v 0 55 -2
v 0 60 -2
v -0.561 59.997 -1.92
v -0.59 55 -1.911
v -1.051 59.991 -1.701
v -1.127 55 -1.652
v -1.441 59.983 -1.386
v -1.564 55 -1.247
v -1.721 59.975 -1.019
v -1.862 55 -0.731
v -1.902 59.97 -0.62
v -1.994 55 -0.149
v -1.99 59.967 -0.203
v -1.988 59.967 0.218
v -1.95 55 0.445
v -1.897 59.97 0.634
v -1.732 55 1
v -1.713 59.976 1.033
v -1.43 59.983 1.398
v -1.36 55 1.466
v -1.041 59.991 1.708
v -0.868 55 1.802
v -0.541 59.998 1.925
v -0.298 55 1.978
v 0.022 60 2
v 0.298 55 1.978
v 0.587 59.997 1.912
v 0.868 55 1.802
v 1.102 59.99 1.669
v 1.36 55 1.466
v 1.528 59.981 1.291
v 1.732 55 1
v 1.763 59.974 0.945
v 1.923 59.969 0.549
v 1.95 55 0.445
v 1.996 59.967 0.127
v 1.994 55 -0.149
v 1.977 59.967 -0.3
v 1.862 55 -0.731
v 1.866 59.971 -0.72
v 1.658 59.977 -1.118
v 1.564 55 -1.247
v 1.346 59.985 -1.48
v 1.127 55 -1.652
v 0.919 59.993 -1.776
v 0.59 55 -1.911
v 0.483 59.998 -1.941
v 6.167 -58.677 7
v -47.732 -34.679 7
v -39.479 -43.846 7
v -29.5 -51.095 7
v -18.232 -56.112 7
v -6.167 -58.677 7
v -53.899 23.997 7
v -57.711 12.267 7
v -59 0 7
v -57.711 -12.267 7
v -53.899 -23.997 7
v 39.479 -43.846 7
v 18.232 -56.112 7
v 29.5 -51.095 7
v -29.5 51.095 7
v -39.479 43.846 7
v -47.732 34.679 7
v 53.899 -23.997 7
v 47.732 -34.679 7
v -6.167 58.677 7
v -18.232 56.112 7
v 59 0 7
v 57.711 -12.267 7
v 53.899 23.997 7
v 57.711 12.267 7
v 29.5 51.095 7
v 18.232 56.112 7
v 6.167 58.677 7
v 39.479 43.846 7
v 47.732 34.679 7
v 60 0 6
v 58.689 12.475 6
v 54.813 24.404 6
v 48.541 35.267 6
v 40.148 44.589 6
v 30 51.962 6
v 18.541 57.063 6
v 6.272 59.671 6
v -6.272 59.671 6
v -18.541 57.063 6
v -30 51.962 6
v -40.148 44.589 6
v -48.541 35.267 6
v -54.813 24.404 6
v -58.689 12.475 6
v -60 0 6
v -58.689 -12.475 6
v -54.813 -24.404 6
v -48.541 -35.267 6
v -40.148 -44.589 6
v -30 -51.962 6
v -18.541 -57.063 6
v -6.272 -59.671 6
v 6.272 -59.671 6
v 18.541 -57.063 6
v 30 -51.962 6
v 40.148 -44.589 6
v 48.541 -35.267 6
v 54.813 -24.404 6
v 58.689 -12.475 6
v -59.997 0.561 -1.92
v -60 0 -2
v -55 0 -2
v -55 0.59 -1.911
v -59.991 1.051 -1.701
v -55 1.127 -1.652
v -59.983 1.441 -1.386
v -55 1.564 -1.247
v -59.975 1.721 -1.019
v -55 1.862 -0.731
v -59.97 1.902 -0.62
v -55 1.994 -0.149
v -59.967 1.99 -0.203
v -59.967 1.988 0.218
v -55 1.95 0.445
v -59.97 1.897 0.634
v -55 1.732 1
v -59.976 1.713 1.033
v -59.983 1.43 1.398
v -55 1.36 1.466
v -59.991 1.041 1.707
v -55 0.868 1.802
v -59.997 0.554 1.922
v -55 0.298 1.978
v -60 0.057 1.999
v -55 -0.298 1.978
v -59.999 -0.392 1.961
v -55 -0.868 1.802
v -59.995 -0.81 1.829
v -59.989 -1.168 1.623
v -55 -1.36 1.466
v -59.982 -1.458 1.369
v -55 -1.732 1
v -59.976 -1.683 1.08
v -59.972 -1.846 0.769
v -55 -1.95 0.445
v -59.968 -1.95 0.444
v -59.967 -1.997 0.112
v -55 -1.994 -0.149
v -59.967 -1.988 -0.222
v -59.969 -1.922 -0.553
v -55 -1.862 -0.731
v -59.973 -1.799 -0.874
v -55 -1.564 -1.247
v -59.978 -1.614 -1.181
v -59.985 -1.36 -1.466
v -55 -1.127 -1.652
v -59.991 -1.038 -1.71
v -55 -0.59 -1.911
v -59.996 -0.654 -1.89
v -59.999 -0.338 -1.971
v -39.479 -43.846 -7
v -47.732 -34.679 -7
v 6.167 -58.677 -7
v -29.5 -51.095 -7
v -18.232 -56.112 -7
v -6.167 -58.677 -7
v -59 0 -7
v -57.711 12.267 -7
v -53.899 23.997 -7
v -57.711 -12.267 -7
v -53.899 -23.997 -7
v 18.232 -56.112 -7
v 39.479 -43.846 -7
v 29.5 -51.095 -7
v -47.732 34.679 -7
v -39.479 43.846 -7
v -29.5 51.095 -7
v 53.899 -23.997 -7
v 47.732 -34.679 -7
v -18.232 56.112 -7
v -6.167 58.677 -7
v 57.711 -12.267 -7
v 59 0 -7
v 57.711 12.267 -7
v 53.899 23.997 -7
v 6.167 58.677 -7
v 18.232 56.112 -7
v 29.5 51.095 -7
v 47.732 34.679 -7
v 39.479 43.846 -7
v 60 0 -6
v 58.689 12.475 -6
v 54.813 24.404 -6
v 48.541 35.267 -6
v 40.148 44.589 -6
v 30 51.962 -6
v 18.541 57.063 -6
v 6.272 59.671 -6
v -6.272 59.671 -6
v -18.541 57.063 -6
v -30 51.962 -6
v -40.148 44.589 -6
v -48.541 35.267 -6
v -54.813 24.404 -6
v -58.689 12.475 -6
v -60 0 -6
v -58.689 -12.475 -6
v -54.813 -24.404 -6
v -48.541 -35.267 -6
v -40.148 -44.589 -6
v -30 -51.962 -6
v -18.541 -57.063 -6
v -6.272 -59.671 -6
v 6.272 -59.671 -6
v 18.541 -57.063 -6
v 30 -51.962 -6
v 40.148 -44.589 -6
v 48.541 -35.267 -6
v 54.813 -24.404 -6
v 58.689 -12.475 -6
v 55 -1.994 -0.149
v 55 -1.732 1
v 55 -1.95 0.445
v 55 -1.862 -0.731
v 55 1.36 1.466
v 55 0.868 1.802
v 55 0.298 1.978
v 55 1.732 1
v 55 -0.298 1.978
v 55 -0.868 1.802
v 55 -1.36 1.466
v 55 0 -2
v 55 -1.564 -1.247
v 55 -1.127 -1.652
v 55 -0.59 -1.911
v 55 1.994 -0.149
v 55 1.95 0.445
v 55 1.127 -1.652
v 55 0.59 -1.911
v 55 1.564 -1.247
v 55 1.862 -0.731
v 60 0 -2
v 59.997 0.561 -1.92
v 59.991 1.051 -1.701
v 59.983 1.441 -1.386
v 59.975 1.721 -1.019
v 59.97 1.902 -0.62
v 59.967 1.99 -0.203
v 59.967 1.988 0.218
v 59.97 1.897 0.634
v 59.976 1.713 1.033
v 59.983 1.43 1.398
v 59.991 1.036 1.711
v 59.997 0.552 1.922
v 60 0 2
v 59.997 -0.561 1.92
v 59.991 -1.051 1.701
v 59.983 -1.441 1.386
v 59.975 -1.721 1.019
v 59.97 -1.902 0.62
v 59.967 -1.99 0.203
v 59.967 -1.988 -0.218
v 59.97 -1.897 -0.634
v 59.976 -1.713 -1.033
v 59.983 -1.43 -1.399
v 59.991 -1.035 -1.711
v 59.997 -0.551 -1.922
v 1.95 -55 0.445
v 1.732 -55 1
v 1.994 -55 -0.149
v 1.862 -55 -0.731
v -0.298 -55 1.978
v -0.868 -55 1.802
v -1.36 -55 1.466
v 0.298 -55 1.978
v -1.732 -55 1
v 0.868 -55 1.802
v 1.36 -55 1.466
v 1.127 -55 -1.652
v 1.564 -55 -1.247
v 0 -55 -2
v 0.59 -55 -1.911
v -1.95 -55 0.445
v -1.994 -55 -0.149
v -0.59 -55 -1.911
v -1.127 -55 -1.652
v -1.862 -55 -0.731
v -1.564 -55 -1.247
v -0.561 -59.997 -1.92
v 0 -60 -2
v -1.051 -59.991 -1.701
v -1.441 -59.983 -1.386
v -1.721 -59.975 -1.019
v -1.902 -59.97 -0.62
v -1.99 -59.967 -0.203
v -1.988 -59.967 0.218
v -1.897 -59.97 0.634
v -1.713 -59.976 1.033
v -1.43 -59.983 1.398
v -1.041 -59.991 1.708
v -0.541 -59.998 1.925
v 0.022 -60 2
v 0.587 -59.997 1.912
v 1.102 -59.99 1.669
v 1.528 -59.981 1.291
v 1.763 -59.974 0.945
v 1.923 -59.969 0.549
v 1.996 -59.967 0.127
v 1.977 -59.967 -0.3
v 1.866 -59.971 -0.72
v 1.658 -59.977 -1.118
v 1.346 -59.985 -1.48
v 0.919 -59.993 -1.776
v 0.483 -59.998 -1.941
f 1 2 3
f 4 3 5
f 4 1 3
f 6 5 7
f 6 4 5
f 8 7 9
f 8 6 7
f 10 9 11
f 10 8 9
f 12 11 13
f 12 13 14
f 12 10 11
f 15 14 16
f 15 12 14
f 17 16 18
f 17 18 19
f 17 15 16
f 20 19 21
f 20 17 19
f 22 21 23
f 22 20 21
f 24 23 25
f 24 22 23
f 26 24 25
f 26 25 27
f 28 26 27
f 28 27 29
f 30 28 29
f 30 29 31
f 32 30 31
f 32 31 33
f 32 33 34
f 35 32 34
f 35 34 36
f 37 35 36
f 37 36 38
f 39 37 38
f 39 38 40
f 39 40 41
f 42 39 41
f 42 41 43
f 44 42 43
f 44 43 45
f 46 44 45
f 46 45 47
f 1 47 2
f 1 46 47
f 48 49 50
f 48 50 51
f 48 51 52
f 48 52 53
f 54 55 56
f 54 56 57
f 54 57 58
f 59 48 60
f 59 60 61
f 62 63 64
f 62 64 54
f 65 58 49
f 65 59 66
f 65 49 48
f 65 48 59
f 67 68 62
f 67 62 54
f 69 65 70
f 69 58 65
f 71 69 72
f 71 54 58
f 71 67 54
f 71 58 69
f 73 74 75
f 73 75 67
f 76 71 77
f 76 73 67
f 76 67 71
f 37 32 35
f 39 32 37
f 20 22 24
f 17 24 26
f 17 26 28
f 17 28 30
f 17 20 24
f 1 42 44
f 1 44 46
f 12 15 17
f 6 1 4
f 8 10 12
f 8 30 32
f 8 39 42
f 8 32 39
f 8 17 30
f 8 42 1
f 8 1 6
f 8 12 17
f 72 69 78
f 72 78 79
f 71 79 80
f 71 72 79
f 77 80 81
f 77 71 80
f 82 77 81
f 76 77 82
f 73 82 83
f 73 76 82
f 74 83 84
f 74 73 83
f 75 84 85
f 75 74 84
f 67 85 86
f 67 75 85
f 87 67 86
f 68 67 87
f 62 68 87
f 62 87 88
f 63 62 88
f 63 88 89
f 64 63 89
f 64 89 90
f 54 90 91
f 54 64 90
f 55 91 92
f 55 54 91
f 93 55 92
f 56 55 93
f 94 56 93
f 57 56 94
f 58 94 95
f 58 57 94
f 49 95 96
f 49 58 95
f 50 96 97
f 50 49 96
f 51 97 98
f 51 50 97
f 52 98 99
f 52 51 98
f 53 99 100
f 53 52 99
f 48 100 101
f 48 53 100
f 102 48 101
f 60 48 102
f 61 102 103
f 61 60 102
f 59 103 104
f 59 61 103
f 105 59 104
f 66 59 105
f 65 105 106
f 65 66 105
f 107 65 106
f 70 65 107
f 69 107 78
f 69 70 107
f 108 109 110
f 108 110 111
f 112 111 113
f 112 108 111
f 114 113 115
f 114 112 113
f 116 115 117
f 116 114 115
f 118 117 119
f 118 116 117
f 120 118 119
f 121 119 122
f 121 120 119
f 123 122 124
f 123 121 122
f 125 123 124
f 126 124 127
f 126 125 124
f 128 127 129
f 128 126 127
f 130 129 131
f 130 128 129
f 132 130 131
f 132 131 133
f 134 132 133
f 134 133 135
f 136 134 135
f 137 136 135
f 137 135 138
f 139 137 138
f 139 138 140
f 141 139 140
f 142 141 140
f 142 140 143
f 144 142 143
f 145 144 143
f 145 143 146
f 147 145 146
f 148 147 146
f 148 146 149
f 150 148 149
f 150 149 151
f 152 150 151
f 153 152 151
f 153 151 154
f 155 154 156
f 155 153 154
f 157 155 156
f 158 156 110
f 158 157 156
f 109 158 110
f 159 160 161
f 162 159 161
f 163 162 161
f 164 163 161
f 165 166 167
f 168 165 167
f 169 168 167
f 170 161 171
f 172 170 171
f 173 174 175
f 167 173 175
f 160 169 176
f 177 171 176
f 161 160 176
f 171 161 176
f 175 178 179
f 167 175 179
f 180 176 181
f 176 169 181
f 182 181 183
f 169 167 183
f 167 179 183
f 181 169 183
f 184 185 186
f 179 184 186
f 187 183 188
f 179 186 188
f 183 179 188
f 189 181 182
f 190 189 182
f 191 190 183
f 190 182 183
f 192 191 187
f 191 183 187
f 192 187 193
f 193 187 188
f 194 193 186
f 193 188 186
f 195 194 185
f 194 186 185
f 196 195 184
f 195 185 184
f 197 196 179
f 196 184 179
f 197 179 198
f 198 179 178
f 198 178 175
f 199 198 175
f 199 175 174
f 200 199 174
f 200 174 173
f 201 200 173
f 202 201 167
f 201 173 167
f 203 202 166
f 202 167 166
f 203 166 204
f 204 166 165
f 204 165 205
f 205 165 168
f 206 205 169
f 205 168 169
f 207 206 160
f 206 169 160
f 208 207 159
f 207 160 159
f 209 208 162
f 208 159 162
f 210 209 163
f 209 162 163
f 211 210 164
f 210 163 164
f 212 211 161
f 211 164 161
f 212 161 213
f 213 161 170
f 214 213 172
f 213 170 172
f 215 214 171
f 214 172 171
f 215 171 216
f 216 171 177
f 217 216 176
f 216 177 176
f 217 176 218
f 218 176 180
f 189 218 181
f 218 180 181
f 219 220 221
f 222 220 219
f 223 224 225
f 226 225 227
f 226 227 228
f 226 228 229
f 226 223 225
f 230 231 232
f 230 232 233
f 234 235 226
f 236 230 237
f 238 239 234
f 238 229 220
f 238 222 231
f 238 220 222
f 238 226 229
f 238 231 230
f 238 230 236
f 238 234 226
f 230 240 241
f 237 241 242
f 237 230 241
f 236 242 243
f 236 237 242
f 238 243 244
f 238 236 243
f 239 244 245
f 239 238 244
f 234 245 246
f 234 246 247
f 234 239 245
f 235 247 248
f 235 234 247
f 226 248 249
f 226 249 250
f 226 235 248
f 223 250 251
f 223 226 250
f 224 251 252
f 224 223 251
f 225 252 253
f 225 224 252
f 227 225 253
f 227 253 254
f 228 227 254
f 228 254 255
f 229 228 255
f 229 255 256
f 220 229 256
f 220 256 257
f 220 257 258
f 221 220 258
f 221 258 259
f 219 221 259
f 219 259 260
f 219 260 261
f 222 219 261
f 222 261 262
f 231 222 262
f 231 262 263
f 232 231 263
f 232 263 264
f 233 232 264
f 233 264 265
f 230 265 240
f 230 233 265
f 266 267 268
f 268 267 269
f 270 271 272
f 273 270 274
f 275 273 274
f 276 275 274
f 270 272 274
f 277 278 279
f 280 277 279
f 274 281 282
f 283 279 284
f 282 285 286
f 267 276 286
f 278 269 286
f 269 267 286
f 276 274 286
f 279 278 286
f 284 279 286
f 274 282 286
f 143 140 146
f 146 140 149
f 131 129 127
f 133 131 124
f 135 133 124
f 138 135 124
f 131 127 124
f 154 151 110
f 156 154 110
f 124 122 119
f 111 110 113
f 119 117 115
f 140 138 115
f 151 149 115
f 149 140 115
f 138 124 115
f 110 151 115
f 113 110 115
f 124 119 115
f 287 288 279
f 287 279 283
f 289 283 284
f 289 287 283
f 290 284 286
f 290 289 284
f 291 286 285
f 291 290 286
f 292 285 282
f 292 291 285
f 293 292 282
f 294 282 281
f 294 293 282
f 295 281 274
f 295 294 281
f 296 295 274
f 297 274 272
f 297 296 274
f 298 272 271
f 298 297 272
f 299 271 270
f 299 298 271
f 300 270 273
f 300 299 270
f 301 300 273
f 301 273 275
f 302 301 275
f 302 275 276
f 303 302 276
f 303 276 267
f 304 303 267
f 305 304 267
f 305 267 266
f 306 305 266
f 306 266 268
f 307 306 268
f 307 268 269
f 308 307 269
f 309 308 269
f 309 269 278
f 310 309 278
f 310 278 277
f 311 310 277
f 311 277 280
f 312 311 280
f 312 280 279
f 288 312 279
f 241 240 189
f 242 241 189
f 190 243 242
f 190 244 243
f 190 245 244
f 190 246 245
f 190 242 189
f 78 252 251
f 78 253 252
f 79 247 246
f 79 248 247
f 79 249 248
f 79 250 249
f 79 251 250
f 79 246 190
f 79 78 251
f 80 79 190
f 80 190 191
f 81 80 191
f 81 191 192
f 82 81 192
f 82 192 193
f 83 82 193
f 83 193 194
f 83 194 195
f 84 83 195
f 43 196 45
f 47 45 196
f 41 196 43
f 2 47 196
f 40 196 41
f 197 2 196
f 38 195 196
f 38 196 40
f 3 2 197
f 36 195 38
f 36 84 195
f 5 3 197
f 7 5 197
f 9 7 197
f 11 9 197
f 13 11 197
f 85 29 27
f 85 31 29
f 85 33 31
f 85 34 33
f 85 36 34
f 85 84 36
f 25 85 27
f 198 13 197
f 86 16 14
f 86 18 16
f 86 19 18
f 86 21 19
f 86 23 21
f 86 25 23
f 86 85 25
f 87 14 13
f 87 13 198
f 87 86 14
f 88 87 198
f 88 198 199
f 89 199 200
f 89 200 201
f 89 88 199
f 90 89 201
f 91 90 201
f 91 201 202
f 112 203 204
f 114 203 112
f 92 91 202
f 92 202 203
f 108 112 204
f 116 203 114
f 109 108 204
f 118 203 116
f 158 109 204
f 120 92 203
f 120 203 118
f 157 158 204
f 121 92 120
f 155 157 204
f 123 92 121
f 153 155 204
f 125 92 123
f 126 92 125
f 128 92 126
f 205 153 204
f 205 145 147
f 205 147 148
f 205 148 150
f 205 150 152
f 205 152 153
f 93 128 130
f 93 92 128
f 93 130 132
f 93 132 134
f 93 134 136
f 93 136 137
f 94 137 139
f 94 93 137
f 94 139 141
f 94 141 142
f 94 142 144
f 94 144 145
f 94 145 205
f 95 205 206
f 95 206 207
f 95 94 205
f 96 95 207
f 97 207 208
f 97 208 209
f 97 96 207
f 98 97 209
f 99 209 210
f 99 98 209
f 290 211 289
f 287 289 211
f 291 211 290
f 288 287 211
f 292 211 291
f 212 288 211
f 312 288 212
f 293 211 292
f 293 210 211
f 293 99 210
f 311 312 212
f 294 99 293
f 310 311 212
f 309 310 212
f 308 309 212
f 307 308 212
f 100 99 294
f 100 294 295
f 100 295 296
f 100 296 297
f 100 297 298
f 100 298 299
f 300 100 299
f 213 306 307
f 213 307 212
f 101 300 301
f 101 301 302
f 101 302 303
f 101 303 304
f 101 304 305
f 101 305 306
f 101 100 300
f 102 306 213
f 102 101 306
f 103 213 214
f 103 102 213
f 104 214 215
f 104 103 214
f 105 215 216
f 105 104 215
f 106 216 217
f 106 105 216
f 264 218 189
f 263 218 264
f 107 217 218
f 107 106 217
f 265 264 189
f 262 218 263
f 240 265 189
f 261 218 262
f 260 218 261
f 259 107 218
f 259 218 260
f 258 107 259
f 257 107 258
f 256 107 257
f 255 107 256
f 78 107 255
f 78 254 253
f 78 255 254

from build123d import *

# Parameters (mm, degrees)
SKETCH1_R           = 60
BOSS_EXTRUDE1_DEPTH = 7
CHAMFER1_SIZE       = 1
CUT_EXTRUDE1_START  = 55
SKETCH2_R           = 2
CUT_EXTRUDE1_DEPTH  = 10
CUT_EXTRUDE2_START  = -65
SKETCH2_2_R         = 2
CUT_EXTRUDE2_DEPTH  = 10
CUT_EXTRUDE3_START  = 55
SKETCH3_R           = 2
CUT_EXTRUDE3_DEPTH  = 10
CUT_EXTRUDE4_START  = -65
SKETCH3_2_R         = 2
CUT_EXTRUDE4_DEPTH  = 10


with BuildPart() as part:
    # Sketch1 → Boss-Extrude1 (new, symmetric)
    with BuildSketch(Plane.XY):
        Circle(SKETCH1_R)
    extrude(amount=BOSS_EXTRUDE1_DEPTH, both=True)

    # Chamfer1
    chamfer1_edges = [part.edges().sort_by_distance(p)[0] for p in [
        (-60, 0, -7),
        (-60, 0, 7),
    ]]
    chamfer(chamfer1_edges, length=CHAMFER1_SIZE)

    # Sketch2 → Cut-Extrude1 (cut)
    with BuildSketch(Plane(origin=(0, 0, 0), x_dir=(1, 0, 0), z_dir=(0, 1, 0)).offset(CUT_EXTRUDE1_START)):
        Circle(SKETCH2_R)
    extrude(amount=CUT_EXTRUDE1_DEPTH, mode=Mode.SUBTRACT)

    # Sketch2<2> → Cut-Extrude2 (cut)
    with BuildSketch(Plane(origin=(0, 0, 0), x_dir=(1, 0, 0), z_dir=(0, 1, 0)).offset(CUT_EXTRUDE2_START)):
        Circle(SKETCH2_2_R)
    extrude(amount=CUT_EXTRUDE2_DEPTH, mode=Mode.SUBTRACT)

    # Sketch3 → Cut-Extrude3 (cut)
    with BuildSketch(Plane(origin=(0, 0, 0), x_dir=(0, 0, -1), z_dir=(1, 0, 0)).offset(CUT_EXTRUDE3_START)):
        Circle(SKETCH3_R)
    extrude(amount=CUT_EXTRUDE3_DEPTH, mode=Mode.SUBTRACT)

    # Sketch3<2> → Cut-Extrude4 (cut)
    with BuildSketch(Plane(origin=(0, 0, 0), x_dir=(0, 0, -1), z_dir=(1, 0, 0)).offset(CUT_EXTRUDE4_START)):
        Circle(SKETCH3_2_R)
    extrude(amount=CUT_EXTRUDE4_DEPTH, mode=Mode.SUBTRACT)


solid = part.part
